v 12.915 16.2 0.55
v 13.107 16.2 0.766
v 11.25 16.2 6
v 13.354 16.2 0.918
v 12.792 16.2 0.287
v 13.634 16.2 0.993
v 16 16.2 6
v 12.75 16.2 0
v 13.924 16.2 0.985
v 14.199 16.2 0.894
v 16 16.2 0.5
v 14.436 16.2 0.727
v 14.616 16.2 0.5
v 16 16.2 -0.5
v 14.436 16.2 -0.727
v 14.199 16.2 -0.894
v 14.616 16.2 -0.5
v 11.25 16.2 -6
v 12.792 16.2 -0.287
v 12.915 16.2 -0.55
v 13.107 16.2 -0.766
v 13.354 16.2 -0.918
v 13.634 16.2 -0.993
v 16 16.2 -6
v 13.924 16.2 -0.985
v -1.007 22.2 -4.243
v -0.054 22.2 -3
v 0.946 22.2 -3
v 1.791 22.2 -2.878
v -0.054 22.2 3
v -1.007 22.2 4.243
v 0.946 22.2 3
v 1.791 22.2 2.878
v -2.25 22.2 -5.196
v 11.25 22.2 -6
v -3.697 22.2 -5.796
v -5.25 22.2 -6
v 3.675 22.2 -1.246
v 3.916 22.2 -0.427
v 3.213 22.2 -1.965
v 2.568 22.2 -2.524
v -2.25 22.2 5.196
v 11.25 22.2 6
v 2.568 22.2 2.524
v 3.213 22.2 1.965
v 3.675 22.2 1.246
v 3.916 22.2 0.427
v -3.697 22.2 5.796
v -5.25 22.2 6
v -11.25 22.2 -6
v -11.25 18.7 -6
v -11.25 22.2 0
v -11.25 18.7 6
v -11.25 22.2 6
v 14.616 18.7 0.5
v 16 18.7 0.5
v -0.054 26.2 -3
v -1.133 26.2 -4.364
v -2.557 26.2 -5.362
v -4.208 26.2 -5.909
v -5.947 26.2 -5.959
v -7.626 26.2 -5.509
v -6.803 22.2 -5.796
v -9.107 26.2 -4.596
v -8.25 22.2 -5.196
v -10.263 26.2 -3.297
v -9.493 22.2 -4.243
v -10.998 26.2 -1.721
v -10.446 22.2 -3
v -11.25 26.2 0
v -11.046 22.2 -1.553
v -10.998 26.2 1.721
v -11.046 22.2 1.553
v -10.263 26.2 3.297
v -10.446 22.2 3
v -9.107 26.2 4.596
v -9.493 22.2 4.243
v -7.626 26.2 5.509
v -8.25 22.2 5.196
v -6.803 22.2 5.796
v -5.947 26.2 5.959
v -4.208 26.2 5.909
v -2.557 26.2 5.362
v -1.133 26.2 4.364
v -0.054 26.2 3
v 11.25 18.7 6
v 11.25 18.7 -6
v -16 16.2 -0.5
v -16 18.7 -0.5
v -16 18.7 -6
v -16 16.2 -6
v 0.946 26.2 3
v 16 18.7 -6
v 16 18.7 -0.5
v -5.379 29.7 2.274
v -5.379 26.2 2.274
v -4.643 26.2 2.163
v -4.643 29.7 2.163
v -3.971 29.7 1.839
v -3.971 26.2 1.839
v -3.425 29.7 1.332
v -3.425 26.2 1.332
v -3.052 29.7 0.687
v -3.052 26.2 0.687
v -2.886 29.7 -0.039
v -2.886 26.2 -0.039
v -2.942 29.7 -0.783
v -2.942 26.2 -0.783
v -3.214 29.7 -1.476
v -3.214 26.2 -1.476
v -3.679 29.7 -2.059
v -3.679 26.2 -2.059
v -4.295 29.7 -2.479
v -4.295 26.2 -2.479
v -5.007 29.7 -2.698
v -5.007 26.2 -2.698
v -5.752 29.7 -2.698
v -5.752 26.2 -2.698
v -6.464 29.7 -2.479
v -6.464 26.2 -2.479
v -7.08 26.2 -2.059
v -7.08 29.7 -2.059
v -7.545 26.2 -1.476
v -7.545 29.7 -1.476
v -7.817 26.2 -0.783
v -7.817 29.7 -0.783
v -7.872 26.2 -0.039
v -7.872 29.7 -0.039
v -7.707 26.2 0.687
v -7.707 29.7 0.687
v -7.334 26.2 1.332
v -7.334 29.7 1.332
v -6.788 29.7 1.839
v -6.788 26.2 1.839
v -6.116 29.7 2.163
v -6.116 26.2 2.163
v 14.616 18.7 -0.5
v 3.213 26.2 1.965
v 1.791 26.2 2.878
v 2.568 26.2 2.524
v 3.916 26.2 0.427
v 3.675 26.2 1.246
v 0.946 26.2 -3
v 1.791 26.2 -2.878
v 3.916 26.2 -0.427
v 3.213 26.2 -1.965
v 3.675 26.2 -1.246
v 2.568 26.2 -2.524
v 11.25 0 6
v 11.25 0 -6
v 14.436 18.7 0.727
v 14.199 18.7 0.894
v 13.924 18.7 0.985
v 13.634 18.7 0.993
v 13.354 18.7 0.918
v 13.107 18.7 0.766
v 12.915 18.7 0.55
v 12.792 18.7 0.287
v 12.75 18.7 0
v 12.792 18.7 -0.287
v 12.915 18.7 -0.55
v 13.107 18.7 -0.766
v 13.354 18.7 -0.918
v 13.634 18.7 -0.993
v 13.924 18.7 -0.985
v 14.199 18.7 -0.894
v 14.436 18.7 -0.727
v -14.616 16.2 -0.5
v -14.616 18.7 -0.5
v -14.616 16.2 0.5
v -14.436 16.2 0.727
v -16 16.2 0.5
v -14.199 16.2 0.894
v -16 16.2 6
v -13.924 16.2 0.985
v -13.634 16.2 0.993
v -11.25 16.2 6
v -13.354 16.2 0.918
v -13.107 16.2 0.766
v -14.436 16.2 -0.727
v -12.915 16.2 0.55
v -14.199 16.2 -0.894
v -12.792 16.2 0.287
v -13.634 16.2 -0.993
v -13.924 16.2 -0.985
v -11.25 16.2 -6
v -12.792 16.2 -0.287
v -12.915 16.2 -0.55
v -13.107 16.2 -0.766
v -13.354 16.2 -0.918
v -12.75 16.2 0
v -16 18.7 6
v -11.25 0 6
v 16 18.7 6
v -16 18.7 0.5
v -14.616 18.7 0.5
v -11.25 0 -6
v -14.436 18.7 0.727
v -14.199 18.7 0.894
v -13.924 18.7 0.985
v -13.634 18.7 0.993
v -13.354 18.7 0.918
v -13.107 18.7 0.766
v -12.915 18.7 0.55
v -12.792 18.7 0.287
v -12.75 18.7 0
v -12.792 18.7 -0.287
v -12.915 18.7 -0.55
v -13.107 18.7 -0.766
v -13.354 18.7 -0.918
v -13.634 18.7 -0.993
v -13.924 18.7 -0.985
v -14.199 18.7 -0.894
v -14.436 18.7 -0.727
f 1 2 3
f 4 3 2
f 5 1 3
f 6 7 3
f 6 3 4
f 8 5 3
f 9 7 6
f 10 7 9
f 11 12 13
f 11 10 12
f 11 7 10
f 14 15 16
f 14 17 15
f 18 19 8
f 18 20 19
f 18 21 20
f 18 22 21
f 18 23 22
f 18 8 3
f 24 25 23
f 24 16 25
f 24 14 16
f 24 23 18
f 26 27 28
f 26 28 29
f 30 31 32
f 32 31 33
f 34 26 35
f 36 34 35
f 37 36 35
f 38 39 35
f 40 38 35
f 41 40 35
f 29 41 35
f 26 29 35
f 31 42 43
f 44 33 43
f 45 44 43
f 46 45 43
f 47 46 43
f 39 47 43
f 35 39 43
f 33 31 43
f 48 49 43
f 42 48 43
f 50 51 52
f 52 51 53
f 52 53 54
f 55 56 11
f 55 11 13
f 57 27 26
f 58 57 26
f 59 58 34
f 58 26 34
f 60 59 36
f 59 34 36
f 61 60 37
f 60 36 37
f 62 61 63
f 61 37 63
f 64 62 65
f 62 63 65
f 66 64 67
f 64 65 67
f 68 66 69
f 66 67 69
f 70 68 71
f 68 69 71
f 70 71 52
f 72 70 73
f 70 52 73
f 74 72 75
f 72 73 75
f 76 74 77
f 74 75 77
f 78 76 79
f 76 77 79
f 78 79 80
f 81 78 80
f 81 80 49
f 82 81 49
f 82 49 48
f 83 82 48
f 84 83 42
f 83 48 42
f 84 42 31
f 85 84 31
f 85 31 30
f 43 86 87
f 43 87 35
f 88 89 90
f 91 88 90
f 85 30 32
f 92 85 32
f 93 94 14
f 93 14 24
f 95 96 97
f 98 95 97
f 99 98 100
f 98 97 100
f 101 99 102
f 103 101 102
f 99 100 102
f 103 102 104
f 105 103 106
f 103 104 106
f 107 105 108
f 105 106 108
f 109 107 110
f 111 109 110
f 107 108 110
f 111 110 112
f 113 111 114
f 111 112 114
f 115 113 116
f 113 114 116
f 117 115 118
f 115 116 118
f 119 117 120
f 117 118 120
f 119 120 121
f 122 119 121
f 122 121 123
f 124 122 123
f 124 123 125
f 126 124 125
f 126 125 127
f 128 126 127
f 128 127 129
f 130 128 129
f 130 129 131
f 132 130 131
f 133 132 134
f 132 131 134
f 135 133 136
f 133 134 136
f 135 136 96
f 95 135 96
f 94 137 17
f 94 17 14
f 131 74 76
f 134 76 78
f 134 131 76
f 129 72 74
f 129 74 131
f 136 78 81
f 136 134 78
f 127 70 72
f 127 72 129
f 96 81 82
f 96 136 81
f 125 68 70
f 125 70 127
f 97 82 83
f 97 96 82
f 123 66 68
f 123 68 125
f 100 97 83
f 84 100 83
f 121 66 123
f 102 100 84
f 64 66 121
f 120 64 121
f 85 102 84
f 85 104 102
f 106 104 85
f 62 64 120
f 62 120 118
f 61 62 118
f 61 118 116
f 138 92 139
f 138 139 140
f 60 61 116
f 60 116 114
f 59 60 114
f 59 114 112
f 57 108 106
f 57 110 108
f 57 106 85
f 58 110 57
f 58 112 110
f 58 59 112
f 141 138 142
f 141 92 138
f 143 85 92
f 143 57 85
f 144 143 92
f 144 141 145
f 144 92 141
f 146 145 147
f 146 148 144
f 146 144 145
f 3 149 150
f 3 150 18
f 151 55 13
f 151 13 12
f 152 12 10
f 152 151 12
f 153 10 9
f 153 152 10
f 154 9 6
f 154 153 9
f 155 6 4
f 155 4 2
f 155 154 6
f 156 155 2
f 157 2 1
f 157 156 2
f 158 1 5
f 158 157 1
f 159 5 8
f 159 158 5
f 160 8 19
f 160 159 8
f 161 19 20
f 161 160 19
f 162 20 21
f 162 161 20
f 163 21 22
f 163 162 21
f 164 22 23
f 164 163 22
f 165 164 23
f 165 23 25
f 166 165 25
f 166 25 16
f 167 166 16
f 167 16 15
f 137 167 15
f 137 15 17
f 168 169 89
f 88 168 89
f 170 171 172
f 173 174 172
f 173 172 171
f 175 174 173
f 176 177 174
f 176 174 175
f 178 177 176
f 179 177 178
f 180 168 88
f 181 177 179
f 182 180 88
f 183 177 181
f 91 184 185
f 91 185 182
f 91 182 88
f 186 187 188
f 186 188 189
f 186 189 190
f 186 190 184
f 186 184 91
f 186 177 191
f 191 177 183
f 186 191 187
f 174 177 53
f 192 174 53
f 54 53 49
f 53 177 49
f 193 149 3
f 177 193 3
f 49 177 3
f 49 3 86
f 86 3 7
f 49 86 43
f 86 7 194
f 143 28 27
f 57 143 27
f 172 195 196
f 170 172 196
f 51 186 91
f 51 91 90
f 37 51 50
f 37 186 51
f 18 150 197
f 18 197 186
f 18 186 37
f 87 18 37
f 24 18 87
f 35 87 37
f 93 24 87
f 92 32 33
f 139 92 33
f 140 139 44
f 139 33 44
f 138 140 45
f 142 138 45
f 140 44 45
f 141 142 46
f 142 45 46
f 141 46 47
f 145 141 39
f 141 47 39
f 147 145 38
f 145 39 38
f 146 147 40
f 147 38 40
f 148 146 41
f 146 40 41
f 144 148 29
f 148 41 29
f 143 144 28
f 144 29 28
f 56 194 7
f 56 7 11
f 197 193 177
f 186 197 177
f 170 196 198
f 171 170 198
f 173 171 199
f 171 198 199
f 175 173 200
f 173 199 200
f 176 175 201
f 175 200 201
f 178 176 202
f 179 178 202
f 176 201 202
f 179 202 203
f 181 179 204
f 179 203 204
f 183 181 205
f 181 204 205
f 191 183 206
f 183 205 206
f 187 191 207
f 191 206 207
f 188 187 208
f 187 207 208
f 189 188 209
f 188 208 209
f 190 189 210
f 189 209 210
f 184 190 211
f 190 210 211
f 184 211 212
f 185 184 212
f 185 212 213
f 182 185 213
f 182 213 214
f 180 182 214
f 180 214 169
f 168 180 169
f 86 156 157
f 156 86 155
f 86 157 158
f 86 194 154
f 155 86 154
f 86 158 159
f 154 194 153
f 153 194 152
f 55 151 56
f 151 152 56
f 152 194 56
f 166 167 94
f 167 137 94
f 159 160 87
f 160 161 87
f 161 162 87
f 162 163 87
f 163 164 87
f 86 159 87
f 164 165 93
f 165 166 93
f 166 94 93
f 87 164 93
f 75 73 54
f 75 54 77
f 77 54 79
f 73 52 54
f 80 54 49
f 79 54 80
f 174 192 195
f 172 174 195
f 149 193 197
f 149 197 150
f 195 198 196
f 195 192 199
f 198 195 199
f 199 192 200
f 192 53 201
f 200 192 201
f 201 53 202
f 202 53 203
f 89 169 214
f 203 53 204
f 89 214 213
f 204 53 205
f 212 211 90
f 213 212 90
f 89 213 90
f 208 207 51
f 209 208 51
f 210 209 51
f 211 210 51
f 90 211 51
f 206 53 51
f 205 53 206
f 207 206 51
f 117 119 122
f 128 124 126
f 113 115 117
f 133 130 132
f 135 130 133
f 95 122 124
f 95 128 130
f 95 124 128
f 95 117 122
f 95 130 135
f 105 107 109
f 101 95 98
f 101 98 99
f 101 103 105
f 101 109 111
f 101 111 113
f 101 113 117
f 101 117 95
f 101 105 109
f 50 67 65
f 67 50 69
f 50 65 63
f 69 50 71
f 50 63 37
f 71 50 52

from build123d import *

# Parameters (mm, degrees)
SKETCH1_W           = 22.5
SKETCH1_H           = 22.2
BOSS_EXTRUDE1_DEPTH = 6
BOSS_EXTRUDE2_DEPTH = 4
SKETCH3_R           = 2.5
BOSS_EXTRUDE3_DEPTH = 3.5
SKETCH4_W           = 12
SKETCH4_H           = 2.5
BOSS_EXTRUDE4_DEPTH = 16
CUT_EXTRUDE1_DEPTH  = 2.5


with BuildPart() as part:
    # Sketch1 → Boss-Extrude1 (new, symmetric)
    with BuildSketch(Plane.XY):
        with Locations((0, 11.1)):
            Rectangle(SKETCH1_W, SKETCH1_H)
    extrude(amount=BOSS_EXTRUDE1_DEPTH, both=True)

    # Sketch2 → Boss-Extrude2 (add)
    with BuildSketch(Plane(origin=(0, 22.2, 0), x_dir=(1, 0, 0), z_dir=(0, 1, 0))):
        with BuildLine():
            Line((0.946152423, 3), (-0.053847577, 3))
            ThreePointArc((-0.053847577, 3), (-11.25, 0), (-0.053847577, -3))
            Line((-0.053847577, -3), (0.946152423, -3))
            ThreePointArc((0.946152423, -3), (3.946152423, 0), (0.946152423, 3))
        make_face()
    extrude(amount=BOSS_EXTRUDE2_DEPTH)

    # Sketch3 → Boss-Extrude3 (add)
    with BuildSketch(Plane(origin=(0, 26.2, 0), x_dir=(1, 0, 0), z_dir=(0, 1, 0))):
        with Locations(Location((-5.379476527, 0.226239141, 0), (0, 0, 270))):
            Circle(SKETCH3_R)
    extrude(amount=BOSS_EXTRUDE3_DEPTH)

    # Sketch4 → Boss-Extrude4 (add, symmetric)
    with BuildSketch(Plane(origin=(0, 0, 0), x_dir=(0, 0, -1), z_dir=(1, 0, 0))):
        with Locations((0, 17.45)):
            Rectangle(SKETCH4_W, SKETCH4_H)
    extrude(amount=BOSS_EXTRUDE4_DEPTH, both=True)

    # Sketch5 → Cut-Extrude1 (cut)
    with BuildSketch(Plane(origin=(0, 18.7, 0), x_dir=(1, 0, 0), z_dir=(0, 1, 0))):
        with BuildLine():
            Line((14.616025404, 0.5), (16, 0.5))
            Line((16, 0.5), (16, -0.5))
            Line((16, -0.5), (14.616025404, -0.5))
            ThreePointArc((14.616025404, -0.5), (12.75, 0), (14.616025404, 0.5))
        make_face()
    cut_extrude1 = extrude(amount=-CUT_EXTRUDE1_DEPTH, mode=Mode.SUBTRACT)

    # Mirror1: Cut-Extrude1 across plane
    add(cut_extrude1.mirror(Plane(origin=(0, 0, 0), x_dir=(0, 0, 1), z_dir=(1, 0, 0))), mode=Mode.SUBTRACT)


solid = part.part
